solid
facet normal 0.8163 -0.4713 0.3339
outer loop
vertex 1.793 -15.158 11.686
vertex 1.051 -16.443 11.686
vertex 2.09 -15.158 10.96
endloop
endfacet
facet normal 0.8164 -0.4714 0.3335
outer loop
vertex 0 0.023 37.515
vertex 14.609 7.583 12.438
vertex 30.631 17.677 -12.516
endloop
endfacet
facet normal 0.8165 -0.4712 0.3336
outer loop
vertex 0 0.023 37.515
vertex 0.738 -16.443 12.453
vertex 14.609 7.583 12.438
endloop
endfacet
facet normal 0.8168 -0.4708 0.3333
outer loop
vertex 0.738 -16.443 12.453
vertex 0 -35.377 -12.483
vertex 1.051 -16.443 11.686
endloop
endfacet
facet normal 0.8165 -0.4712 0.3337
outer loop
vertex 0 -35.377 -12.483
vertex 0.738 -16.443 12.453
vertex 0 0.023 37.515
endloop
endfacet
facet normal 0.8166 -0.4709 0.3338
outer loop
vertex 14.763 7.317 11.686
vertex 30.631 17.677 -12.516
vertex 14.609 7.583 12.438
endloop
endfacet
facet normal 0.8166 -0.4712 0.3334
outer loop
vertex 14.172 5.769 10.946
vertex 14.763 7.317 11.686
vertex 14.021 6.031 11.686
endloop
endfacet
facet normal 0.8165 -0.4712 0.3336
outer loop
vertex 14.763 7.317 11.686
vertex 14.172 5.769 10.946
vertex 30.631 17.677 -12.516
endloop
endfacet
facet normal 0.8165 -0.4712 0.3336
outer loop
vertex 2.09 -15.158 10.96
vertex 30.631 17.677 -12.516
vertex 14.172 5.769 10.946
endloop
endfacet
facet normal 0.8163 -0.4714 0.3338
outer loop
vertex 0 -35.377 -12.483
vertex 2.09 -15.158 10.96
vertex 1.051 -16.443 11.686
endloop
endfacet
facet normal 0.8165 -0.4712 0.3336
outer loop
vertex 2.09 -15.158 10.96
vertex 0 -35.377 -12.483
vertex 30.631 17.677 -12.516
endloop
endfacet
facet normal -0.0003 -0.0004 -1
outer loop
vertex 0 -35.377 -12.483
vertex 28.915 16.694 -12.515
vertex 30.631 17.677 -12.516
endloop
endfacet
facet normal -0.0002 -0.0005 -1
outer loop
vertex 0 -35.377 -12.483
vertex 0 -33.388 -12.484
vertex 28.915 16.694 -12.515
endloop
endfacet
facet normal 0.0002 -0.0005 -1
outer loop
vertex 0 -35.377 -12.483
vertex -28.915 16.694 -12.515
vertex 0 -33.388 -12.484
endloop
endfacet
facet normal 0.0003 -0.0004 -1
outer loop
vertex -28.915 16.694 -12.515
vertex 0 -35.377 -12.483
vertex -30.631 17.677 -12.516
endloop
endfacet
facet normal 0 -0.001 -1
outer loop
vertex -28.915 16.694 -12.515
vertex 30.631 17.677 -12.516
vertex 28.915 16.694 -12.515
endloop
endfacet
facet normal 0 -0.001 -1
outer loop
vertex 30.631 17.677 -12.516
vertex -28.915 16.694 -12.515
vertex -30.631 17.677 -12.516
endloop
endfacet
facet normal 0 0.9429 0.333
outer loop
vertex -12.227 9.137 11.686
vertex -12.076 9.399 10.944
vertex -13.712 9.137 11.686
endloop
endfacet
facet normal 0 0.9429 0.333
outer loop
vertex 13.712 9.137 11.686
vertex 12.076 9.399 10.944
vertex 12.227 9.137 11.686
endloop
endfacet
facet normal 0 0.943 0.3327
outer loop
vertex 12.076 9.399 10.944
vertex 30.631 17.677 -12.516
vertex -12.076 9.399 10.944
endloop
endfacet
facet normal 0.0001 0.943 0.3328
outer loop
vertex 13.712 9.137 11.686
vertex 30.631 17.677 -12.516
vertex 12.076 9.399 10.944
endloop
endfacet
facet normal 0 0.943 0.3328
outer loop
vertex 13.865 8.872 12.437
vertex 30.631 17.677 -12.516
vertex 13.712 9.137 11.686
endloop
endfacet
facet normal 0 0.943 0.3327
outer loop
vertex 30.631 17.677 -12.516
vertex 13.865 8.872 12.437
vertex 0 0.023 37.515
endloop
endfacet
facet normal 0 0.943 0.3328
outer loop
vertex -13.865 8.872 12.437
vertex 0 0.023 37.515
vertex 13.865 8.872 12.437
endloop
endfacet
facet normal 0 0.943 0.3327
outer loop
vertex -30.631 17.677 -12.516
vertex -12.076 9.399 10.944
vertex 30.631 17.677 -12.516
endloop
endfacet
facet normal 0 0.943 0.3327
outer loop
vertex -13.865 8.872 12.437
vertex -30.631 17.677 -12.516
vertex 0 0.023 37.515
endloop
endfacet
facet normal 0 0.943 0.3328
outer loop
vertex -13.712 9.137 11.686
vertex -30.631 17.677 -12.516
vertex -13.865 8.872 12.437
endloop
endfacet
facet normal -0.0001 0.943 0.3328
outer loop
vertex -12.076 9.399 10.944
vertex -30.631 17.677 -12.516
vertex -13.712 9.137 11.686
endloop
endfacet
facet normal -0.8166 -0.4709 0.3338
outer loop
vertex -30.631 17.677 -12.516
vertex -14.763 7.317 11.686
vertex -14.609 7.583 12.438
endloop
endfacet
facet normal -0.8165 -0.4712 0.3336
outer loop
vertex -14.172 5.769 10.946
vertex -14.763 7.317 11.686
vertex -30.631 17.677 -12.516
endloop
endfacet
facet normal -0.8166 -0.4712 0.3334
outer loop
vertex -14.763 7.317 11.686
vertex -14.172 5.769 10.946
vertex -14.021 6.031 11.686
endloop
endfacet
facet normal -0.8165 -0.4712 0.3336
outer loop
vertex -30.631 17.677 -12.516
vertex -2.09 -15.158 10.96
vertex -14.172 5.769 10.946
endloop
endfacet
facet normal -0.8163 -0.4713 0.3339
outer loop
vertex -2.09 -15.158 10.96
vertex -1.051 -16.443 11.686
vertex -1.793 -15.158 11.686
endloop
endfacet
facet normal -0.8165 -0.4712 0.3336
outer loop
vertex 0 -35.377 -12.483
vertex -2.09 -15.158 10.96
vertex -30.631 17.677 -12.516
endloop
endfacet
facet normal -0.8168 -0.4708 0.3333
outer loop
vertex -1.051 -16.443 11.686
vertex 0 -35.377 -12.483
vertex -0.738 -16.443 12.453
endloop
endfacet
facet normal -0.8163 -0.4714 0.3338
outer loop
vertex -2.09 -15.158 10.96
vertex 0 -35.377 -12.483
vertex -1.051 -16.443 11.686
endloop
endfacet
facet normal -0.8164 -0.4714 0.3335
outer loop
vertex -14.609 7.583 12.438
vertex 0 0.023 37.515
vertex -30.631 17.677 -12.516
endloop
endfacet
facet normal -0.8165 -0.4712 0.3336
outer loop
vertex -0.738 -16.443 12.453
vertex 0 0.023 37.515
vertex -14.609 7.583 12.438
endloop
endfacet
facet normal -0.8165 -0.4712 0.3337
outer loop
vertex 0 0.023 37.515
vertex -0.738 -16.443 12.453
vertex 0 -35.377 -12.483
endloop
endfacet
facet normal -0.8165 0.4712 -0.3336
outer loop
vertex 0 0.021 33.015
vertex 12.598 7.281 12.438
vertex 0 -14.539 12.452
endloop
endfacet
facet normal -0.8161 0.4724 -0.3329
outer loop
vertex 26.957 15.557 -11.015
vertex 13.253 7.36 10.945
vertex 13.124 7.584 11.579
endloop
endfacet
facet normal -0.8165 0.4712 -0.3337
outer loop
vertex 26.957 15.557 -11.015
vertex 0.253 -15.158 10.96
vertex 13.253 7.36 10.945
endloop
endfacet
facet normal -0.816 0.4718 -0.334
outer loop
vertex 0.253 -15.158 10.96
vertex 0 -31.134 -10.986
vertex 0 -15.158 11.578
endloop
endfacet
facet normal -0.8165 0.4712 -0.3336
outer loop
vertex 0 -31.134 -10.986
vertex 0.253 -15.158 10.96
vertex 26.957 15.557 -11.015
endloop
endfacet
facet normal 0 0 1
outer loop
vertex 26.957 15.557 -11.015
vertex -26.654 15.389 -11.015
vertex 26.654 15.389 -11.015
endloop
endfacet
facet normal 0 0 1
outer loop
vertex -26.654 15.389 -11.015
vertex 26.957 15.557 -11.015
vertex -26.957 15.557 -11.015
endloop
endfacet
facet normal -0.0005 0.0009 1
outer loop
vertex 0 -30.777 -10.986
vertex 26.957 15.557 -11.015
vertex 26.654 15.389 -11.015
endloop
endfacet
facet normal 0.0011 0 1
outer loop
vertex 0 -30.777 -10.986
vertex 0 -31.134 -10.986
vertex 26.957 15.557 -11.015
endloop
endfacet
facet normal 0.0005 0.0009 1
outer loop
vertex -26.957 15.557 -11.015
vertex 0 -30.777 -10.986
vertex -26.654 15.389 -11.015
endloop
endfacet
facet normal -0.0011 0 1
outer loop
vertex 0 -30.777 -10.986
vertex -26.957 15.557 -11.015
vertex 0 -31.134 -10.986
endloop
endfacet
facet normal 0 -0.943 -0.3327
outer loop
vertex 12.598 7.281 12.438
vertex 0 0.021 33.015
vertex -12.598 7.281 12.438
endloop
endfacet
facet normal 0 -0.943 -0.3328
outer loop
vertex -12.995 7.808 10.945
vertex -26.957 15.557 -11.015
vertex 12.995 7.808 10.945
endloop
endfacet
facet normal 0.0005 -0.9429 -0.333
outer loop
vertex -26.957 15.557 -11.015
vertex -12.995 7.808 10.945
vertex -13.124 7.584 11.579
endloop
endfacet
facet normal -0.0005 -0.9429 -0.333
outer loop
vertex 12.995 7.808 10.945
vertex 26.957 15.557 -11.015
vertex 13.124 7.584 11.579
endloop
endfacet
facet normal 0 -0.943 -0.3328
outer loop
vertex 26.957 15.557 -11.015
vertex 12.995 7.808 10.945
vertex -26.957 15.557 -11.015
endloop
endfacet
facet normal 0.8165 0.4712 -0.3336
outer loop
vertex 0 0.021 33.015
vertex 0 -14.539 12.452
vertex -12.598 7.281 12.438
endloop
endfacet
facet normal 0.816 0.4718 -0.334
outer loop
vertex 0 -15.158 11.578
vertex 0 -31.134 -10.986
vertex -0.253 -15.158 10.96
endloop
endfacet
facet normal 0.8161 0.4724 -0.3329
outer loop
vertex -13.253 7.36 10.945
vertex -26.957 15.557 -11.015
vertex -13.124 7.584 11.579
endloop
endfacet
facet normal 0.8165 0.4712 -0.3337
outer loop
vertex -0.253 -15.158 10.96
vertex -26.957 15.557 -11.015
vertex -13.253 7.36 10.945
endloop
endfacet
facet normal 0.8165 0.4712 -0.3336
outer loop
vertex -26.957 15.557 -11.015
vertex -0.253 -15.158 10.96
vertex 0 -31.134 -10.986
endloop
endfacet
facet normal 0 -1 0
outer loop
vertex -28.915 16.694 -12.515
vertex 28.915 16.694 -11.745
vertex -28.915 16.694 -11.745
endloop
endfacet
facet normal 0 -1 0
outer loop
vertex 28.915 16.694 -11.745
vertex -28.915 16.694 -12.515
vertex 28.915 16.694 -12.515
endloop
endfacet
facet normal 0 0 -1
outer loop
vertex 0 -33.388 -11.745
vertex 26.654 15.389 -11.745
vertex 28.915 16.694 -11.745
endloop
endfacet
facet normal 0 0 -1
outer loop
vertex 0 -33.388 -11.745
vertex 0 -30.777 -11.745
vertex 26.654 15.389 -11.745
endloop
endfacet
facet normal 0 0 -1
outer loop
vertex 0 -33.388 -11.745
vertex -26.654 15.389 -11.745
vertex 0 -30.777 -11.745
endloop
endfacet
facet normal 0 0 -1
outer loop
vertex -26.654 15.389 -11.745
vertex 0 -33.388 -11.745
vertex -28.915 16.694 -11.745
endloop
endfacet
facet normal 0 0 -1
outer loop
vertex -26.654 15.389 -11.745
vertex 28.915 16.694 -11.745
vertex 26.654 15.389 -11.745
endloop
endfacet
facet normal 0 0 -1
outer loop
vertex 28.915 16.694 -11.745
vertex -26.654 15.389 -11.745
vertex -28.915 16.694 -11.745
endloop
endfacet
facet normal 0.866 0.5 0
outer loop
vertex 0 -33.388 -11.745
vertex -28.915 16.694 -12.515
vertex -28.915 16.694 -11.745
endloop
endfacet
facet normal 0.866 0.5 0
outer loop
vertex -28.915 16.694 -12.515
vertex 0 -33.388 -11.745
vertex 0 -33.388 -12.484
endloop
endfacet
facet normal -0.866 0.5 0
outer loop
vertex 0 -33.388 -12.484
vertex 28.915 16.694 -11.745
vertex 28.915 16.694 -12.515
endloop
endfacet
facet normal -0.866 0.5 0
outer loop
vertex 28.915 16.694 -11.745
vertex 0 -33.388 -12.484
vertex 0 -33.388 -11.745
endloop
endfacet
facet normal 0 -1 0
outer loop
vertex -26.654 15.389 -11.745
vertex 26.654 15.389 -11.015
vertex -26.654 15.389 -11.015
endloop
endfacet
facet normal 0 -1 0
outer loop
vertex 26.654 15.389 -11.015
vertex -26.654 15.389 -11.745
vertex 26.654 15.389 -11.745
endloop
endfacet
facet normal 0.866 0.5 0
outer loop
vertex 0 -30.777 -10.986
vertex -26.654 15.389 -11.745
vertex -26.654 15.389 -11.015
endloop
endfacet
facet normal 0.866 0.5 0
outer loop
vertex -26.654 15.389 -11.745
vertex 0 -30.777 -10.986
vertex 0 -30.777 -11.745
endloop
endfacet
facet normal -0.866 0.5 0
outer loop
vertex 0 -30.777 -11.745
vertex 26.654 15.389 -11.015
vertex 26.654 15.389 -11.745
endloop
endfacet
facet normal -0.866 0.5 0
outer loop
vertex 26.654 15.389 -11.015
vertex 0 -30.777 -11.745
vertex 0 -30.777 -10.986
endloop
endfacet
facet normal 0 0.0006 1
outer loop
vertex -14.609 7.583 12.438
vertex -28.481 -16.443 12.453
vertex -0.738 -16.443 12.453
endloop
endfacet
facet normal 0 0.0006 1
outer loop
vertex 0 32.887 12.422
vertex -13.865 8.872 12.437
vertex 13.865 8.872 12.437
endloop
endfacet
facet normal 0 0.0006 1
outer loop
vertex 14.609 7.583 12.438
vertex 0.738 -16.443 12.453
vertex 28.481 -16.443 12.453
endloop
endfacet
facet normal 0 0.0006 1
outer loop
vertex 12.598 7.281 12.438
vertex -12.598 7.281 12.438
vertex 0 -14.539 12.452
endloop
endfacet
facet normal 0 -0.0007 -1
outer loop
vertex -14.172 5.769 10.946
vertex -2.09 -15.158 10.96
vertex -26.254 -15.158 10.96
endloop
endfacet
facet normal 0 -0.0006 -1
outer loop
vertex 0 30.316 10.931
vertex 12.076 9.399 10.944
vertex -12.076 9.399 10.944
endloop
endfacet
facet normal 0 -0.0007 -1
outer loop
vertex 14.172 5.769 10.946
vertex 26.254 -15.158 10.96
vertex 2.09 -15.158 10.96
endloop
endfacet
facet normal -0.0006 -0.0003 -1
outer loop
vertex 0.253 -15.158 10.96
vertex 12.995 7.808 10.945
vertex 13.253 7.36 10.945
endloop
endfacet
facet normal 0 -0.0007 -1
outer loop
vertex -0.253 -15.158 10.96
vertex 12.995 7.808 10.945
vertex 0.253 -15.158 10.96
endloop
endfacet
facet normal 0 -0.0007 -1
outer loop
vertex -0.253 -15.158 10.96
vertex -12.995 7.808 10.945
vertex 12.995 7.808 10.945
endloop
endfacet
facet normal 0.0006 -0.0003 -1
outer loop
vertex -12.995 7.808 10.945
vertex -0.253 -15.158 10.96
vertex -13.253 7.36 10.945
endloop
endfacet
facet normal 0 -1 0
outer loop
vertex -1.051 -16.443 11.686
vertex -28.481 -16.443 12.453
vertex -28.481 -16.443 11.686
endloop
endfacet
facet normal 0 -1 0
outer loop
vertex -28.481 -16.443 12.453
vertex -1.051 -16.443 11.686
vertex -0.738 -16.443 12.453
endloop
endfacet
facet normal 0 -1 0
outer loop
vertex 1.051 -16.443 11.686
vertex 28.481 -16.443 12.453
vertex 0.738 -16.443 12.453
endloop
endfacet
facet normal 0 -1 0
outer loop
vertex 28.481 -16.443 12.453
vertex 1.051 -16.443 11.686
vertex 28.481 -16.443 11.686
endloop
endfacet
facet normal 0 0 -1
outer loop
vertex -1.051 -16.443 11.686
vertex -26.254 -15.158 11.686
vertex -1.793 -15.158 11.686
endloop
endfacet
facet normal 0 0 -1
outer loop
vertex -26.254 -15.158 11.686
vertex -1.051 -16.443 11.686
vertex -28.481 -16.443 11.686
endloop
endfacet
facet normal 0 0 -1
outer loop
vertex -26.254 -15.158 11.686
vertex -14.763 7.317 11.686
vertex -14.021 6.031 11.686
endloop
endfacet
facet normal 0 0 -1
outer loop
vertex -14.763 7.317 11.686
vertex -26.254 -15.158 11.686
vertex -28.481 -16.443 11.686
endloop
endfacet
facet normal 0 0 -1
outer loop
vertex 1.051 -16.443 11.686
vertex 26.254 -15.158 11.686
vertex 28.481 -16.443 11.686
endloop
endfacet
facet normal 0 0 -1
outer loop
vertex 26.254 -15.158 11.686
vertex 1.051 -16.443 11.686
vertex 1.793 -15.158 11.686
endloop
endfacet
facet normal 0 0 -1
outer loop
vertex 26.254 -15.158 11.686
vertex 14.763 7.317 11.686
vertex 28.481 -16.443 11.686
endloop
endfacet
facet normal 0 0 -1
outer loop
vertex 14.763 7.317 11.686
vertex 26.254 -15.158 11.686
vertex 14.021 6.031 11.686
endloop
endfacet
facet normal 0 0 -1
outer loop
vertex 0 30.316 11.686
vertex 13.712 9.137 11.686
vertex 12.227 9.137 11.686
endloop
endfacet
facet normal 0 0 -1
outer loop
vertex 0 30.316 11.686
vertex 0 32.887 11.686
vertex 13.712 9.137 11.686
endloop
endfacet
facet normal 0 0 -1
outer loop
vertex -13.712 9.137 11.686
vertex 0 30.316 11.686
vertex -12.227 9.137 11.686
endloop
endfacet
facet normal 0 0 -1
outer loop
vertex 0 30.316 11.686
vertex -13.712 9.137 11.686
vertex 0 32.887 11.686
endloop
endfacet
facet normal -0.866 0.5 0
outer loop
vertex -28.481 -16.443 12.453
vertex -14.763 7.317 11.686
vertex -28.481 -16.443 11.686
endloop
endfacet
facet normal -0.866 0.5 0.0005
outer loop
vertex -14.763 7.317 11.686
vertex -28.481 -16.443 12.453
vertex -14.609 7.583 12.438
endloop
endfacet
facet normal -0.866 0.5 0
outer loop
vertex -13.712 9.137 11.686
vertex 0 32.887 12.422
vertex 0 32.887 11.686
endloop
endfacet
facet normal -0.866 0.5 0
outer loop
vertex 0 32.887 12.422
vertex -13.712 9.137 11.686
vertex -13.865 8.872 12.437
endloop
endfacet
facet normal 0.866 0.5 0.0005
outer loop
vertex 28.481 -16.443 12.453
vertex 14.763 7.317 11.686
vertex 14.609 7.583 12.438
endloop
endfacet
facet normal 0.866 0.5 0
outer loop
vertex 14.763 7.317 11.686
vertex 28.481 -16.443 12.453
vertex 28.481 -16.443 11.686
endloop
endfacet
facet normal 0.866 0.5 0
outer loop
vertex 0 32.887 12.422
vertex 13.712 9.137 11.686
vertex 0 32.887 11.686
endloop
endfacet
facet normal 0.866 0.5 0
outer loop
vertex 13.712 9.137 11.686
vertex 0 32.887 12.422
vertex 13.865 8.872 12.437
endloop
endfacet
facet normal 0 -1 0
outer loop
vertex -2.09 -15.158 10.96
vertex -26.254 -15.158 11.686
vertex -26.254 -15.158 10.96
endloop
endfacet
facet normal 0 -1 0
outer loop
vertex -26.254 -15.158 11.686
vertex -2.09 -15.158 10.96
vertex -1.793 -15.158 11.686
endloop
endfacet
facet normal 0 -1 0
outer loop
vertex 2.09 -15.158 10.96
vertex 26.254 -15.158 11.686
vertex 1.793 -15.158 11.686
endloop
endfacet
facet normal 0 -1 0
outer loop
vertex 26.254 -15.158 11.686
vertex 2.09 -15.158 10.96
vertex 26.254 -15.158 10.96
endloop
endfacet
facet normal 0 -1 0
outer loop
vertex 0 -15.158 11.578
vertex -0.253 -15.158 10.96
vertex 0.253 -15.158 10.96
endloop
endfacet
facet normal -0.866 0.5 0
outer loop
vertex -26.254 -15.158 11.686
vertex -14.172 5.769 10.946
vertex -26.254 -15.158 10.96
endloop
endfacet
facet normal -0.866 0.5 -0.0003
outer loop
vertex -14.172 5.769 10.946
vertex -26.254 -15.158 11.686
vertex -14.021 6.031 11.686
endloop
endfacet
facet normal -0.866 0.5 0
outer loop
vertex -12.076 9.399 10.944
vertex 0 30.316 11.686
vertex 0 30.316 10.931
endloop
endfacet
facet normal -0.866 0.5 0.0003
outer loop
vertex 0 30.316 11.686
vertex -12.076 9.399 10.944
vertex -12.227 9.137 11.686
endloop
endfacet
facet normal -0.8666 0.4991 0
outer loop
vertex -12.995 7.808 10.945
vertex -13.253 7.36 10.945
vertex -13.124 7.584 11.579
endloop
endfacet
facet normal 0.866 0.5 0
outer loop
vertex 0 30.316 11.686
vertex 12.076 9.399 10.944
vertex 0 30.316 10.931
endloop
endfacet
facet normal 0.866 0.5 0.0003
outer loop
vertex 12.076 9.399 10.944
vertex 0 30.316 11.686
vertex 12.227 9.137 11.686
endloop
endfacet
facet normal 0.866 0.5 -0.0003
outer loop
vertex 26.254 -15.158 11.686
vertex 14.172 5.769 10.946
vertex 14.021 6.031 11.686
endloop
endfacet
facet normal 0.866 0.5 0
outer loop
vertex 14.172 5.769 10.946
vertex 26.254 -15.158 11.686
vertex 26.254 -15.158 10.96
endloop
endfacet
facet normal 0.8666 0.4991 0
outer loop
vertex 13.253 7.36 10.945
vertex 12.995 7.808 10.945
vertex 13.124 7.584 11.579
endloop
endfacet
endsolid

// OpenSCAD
arete = 61.262;
paroi = 1.5;
echelleReductionAjustementBouchon = 0.985;
r = 0.19; // résolution d'impression sur l'axe Z
tetra_sch = [3,3];
Cpi = 3.14159;
Cphi = (1+sqrt(5))/2;
Cepsilon = 0.00000001;

function tetra_ext_radius(a) = 
    a/4*sqrt(6);
    
function tetra_int_radius(a) = 
    a/12*sqrt(6);
    
function tetra_arete_from(radius) = 
    radius*12/sqrt(6);
    
externalRadius = tetra_ext_radius(arete);
internalRadius = tetra_ext_radius( 
                    tetra_arete_from(
                        tetra_int_radius(arete)-paroi));
                        
echo(externalRadius); 
echo(internalRadius);

//tetrahedron(arete);
//tetra_creux();
//decoupe_bouchon();
corps_ouvert();
bouchon();
//trou();

module corps_ouvert() {
	difference() {
		tetra_creux();
		decoupe_bouchon();
	}
}

module bouchon() {
    rotate([180, 0, 0])
	scale([echelleReductionAjustementBouchon, echelleReductionAjustementBouchon, 0.995])
	difference () {
        intersection() {
            tetra_creux();
            decoupe_bouchon(echelleReductionAjustementBouchon);
        }
	}
}

module tetra_creux() {
	difference() {
        tetrahedron(externalRadius);
        tetrahedron(internalRadius);
	}
}

module decoupe_bouchon(scale=1) {
    distance = tetra_int_radius(arete);
	rotate([0,0,30]) translate([0,0,-distance-2*r])
		cylinder(6*r, r=arete*0.545, $fn=3);
	rotate([0,0,30]) translate([0,0,-distance])
		cylinder(8*r, r=(arete-paroi)*0.515, $fn=3);
}


module tetrahedron(rad) {
    // create an instance of a spherical coordinate
    // long - rotation around z -axis
    // lat - latitude, starting at 0 == 'north pole'
    // rad - distance from center
    function sph(long, lat, rad=1) = [long, lat, rad];
    
    // Convert spherical to cartesian
    function sph_to_cart(s) = [
	clean(s[2]*sin(s[1])*cos(s[0])),  

	clean(s[2]*sin(s[1])*sin(s[0])),

	clean(s[2]*cos(s[1]))
	];

    function sphu_from_cart(c, rad=1) = sph(
        atan2(c[1],c[0]), 
        atan2(sqrt(c[0]*c[0]+c[1]*c[1]), c[2]), 
        rad
        );

    tetra_cart = [
        [+1, +1, +1],
        [-1, -1, +1],
        [-1, +1, -1],
        [+1, -1, -1]
    ];

    function tetra_unit(rad=1) = [
        sph_to_cart(sphu_from_cart(tetra_cart[0], rad)), 
        sph_to_cart(sphu_from_cart(tetra_cart[1], rad)),
        sph_to_cart(sphu_from_cart(tetra_cart[2], rad)),
        sph_to_cart(sphu_from_cart(tetra_cart[3], rad)),
        ];


    tetrafaces = [
        [0, 3, 1],
        [0,1,2],
        [2,1,3],
        [0,2,3]
    ];

    tetra_edges = [
        [0,1],
        [0,2],
        [0,3], 
        [1,2], 
        [1,3], 
        [2,3],	
        ];

    rotate([54.7, 0, 0])
    rotate([0, 0, 45])
    polyhedron(tetra_unit(rad), faces=tetrafaces);
}
//translate([0, 0, -17.7])
//cylinder(5,40,40);

function clean(n) = (n < 0) ? ((n < -Cepsilon) ? n : 0) : 
	(n < Cepsilon) ? 0 : n; 

function plat_dihedral(pq) = 2 * asin( cos(180/pq[1])/sin(180/pq[0]));

function plat_circumradius(pq, a) = 
	(a/2)*
	tan(Cpi/pq[1])*
	tan(plat_dihedral(pq)/2);

function plat_midradius(pq, a) = 
	(a/2)*
	cos(Cpi/pq[0])*
	tan(plat_dihedral(pq)/2);

function plat_inradius(pq,a) = 
	a/(2*tan(Cpi/pq[0]))*
	sqrt((1-cos(plat_dihedral(pq)))/(1+cos(plat_dihedral(pq))));

function plat_a_from_inradius(pq, inradius) =
    inradius*(2*tan(Cpi/pq[0]))/
	sqrt((1-cos(plat_dihedral(pq)))/(1+cos(plat_dihedral(pq))));
